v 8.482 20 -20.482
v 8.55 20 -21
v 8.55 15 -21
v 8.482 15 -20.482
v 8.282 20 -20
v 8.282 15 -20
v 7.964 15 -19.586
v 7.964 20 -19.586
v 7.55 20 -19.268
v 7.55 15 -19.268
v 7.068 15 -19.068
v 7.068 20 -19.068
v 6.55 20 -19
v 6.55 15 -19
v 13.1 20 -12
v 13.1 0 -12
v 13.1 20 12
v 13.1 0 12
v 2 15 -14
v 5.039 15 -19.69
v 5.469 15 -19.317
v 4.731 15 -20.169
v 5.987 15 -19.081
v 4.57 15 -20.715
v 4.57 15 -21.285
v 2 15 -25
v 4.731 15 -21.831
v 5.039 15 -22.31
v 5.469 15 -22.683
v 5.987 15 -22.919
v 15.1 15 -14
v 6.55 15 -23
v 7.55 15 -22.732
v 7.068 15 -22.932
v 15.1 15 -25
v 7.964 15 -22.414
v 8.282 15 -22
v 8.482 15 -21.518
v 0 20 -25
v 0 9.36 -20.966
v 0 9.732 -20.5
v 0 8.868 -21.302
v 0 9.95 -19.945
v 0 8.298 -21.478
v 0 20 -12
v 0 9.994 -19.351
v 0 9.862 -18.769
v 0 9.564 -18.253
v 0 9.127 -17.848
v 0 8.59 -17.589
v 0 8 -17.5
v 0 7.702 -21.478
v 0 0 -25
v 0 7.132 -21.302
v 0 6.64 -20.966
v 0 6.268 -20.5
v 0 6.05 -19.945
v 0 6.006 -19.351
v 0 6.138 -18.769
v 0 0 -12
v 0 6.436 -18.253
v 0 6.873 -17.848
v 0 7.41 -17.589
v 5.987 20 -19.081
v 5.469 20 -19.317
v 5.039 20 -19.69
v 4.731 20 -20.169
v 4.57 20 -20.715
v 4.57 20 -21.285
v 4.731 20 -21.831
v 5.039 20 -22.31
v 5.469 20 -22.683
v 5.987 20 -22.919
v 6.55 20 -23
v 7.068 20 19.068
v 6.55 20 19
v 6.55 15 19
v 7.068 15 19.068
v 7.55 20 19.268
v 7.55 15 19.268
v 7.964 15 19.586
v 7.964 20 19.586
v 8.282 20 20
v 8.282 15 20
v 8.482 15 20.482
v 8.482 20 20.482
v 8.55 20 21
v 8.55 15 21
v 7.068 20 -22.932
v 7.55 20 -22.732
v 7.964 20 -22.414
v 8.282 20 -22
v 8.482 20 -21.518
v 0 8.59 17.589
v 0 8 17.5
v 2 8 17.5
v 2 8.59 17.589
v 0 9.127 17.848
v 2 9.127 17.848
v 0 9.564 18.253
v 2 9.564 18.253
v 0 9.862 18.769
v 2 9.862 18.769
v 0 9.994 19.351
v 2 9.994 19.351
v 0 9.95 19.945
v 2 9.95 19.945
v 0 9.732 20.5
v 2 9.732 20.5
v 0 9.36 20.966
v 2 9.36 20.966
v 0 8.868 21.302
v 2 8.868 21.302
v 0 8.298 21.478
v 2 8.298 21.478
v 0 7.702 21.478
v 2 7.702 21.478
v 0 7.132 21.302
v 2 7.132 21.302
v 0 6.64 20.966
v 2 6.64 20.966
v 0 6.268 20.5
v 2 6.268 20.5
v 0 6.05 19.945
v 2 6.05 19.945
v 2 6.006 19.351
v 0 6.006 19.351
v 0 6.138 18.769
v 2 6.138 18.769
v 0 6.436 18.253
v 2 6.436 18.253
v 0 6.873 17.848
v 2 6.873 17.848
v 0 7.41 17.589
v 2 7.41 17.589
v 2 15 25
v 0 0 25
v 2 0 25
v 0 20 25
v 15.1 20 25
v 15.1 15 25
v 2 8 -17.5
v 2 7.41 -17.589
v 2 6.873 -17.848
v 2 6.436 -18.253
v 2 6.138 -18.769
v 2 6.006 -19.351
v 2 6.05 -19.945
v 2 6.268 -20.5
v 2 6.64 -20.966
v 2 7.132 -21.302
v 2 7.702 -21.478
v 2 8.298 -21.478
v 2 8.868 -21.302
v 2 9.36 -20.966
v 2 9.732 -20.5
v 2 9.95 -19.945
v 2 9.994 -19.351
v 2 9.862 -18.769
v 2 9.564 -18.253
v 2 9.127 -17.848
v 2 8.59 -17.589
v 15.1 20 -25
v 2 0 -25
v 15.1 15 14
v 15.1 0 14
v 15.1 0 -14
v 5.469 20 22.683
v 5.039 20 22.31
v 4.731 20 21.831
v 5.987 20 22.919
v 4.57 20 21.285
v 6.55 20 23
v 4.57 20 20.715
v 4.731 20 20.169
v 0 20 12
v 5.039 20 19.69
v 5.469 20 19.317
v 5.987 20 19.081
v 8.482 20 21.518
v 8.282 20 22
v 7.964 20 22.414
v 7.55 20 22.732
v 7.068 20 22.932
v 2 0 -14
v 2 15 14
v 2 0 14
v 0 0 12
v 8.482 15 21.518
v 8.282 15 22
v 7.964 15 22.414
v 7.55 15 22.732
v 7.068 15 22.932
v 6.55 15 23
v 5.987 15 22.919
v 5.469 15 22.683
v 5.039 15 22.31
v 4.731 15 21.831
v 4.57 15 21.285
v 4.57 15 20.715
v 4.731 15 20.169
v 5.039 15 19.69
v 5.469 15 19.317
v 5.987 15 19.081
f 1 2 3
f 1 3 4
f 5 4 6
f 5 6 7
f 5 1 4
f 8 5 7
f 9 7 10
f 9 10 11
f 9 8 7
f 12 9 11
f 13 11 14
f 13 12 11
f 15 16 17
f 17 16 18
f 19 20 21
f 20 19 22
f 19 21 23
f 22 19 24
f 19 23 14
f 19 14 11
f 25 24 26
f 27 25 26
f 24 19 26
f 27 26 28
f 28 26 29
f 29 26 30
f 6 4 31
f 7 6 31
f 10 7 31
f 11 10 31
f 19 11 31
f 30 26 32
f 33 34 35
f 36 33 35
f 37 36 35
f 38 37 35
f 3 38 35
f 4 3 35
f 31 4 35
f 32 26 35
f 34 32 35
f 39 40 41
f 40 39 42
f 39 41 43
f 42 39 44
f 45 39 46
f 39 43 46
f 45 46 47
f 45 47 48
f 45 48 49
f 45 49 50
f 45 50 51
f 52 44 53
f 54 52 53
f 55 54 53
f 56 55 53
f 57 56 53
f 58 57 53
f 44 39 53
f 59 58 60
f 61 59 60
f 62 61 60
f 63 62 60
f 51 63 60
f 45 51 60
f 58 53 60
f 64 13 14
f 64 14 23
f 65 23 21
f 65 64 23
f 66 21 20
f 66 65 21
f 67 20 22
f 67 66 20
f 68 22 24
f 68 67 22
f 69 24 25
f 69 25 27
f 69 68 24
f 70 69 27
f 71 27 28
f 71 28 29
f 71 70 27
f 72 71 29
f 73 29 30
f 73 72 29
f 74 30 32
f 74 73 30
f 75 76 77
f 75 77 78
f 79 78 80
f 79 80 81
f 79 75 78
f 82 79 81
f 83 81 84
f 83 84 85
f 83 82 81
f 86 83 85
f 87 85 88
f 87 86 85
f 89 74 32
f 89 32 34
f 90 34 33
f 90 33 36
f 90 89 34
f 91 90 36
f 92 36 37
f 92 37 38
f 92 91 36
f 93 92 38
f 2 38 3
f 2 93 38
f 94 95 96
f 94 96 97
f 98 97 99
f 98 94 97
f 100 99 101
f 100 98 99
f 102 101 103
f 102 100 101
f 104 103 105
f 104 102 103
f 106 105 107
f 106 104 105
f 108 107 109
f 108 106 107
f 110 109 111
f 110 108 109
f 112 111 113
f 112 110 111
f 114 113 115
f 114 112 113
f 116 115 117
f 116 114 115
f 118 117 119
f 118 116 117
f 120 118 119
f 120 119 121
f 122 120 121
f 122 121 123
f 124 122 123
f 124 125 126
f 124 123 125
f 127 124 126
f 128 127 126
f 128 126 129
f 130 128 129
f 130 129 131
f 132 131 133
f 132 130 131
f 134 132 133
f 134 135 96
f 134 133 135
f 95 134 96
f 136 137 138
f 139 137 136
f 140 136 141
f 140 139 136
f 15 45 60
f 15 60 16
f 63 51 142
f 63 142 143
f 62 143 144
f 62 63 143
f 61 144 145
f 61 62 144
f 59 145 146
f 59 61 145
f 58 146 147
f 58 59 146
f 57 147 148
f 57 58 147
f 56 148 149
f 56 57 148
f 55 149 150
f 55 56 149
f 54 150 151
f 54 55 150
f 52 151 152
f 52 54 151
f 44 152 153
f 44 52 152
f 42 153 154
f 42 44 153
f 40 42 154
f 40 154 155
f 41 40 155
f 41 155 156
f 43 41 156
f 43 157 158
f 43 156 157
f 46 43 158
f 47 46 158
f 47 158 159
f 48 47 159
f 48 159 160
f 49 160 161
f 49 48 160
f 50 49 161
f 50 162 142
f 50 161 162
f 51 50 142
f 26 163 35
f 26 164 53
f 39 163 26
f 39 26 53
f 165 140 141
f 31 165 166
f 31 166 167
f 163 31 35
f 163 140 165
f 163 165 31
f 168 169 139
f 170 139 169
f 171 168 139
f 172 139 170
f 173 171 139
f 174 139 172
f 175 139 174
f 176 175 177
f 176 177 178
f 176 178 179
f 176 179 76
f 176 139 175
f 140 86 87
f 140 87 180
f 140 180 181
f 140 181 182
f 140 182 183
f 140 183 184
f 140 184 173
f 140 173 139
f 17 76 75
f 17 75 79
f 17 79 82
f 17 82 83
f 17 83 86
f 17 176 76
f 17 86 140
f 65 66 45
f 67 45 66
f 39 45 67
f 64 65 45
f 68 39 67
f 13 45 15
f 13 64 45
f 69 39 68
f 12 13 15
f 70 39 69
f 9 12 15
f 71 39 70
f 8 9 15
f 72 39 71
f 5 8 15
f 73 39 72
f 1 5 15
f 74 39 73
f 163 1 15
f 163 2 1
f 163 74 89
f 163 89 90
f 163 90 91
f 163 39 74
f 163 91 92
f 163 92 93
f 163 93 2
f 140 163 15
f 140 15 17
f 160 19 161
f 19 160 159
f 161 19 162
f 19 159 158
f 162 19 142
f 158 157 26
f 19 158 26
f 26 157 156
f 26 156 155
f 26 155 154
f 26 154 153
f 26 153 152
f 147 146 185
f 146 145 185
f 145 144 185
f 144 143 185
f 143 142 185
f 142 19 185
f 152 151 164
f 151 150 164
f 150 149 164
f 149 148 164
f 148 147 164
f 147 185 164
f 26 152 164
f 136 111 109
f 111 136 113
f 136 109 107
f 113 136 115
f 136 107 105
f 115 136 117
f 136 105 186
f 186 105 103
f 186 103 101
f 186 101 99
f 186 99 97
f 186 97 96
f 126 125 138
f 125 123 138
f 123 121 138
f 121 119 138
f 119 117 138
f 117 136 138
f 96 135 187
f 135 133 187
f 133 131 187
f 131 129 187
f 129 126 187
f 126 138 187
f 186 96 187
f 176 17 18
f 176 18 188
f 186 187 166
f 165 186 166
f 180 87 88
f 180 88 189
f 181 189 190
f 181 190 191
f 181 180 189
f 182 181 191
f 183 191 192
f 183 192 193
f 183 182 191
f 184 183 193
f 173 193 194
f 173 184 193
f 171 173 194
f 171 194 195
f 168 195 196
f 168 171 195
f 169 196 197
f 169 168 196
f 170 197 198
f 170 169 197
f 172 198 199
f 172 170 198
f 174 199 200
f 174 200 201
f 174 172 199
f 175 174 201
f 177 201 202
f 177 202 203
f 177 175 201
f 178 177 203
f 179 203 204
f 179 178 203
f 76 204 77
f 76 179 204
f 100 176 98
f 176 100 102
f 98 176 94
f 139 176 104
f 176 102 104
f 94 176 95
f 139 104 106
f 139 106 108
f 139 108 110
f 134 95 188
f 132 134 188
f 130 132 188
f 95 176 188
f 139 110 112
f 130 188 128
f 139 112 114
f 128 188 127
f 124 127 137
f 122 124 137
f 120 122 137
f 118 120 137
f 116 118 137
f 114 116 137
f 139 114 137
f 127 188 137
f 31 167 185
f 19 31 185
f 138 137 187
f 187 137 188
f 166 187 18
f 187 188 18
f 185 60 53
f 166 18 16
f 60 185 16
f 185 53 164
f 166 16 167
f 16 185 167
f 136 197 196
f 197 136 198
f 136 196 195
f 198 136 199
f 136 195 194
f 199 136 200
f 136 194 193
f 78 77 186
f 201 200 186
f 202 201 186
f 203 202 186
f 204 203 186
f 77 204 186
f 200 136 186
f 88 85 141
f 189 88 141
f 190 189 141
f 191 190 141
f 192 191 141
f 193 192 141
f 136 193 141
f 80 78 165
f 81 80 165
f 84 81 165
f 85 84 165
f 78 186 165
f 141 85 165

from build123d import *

# Parameters (mm, degrees)
BOSS_EXTRUDE1_DEPTH     = 20
CUT_EXTRUDE1_DEPTH      = 35.59205111
CUT_EXTRUDE1_DEPTH_BACK = 35.59205111
SKETCH4_R               = 2
BOSS_EXTRUDE2_START     = 20
BOSS_EXTRUDE2_DEPTH     = 5


with BuildPart() as part:
    # Sketch1 → Boss-Extrude1 (new body)
    with BuildSketch(Plane(origin=(0, 0, 0), x_dir=(1, 0, 0), z_dir=(0, 1, 0))):
        Polygon((15.1, -14), (15.1, 14), (2, 14), (2, 25), (0, 25), (0, 12), (13.1, 12), (13.1, -12), (0, -12), (0, -25), (2, -25), (2, -14), align=None)
    extrude(amount=BOSS_EXTRUDE1_DEPTH)

    # Sketch4 → Cut-Extrude1 (cut, two sides: drawn at the far end of the back side and taken through both)
    with BuildSketch(Plane(origin=(2, 0, 0), x_dir=(0, 0, -1), z_dir=(1, 0, 0)).offset(-CUT_EXTRUDE1_DEPTH_BACK)):
        with Locations((-19.5, 8)):
            Circle(SKETCH4_R)
        with Locations(Location((19.5, 8, 0), (0, 0, 180))):
            Circle(SKETCH4_R)
    extrude(amount=CUT_EXTRUDE1_DEPTH + CUT_EXTRUDE1_DEPTH_BACK, mode=Mode.SUBTRACT)

    # Sketch1<31> → Boss-Extrude2 (add)
    with BuildSketch(Plane(origin=(0, 0, 0), x_dir=(1, 0, 0), z_dir=(0, 1, 0)).offset(BOSS_EXTRUDE2_START)):
        with BuildLine():
            Line((15.1, -25), (15.1, -14))
            Line((15.1, -14), (6.55, -14))
            Line((6.55, -14), (6.55, -19))
            ThreePointArc((6.55, -19), (7.964213562, -19.585786438), (8.55, -21))
            ThreePointArc((8.55, -21), (7.964213562, -22.414213562), (6.55, -23))
            Line((6.55, -23), (6.55, -25))
            Line((6.55, -25), (15.1, -25))
        make_face()
        with BuildLine():
            Line((6.55, -19), (6.55, -14))
            Line((6.55, -14), (2, -14))
            Line((2, -14), (2, -25))
            Line((2, -25), (6.55, -25))
            Line((6.55, -25), (6.55, -23))
            ThreePointArc((6.55, -23), (4.55, -21), (6.55, -19))
        make_face()
        with BuildLine():
            Line((6.55, 14), (15.1, 14))
            Line((15.1, 14), (15.1, 25))
            Line((15.1, 25), (6.55, 25))
            Line((6.55, 25), (6.55, 23))
            ThreePointArc((6.55, 23), (7.964213562, 22.414213562), (8.55, 21))
            ThreePointArc((8.55, 21), (7.964213562, 19.585786438), (6.55, 19))
            Line((6.55, 19), (6.55, 14))
        make_face()
        with BuildLine():
            Line((2, 14), (6.55, 14))
            Line((6.55, 14), (6.55, 19))
            ThreePointArc((6.55, 19), (4.55, 21), (6.55, 23))
            Line((6.55, 23), (6.55, 25))
            Line((6.55, 25), (2, 25))
            Line((2, 25), (2, 14))
        make_face()
    extrude(amount=-BOSS_EXTRUDE2_DEPTH)


solid = part.part
